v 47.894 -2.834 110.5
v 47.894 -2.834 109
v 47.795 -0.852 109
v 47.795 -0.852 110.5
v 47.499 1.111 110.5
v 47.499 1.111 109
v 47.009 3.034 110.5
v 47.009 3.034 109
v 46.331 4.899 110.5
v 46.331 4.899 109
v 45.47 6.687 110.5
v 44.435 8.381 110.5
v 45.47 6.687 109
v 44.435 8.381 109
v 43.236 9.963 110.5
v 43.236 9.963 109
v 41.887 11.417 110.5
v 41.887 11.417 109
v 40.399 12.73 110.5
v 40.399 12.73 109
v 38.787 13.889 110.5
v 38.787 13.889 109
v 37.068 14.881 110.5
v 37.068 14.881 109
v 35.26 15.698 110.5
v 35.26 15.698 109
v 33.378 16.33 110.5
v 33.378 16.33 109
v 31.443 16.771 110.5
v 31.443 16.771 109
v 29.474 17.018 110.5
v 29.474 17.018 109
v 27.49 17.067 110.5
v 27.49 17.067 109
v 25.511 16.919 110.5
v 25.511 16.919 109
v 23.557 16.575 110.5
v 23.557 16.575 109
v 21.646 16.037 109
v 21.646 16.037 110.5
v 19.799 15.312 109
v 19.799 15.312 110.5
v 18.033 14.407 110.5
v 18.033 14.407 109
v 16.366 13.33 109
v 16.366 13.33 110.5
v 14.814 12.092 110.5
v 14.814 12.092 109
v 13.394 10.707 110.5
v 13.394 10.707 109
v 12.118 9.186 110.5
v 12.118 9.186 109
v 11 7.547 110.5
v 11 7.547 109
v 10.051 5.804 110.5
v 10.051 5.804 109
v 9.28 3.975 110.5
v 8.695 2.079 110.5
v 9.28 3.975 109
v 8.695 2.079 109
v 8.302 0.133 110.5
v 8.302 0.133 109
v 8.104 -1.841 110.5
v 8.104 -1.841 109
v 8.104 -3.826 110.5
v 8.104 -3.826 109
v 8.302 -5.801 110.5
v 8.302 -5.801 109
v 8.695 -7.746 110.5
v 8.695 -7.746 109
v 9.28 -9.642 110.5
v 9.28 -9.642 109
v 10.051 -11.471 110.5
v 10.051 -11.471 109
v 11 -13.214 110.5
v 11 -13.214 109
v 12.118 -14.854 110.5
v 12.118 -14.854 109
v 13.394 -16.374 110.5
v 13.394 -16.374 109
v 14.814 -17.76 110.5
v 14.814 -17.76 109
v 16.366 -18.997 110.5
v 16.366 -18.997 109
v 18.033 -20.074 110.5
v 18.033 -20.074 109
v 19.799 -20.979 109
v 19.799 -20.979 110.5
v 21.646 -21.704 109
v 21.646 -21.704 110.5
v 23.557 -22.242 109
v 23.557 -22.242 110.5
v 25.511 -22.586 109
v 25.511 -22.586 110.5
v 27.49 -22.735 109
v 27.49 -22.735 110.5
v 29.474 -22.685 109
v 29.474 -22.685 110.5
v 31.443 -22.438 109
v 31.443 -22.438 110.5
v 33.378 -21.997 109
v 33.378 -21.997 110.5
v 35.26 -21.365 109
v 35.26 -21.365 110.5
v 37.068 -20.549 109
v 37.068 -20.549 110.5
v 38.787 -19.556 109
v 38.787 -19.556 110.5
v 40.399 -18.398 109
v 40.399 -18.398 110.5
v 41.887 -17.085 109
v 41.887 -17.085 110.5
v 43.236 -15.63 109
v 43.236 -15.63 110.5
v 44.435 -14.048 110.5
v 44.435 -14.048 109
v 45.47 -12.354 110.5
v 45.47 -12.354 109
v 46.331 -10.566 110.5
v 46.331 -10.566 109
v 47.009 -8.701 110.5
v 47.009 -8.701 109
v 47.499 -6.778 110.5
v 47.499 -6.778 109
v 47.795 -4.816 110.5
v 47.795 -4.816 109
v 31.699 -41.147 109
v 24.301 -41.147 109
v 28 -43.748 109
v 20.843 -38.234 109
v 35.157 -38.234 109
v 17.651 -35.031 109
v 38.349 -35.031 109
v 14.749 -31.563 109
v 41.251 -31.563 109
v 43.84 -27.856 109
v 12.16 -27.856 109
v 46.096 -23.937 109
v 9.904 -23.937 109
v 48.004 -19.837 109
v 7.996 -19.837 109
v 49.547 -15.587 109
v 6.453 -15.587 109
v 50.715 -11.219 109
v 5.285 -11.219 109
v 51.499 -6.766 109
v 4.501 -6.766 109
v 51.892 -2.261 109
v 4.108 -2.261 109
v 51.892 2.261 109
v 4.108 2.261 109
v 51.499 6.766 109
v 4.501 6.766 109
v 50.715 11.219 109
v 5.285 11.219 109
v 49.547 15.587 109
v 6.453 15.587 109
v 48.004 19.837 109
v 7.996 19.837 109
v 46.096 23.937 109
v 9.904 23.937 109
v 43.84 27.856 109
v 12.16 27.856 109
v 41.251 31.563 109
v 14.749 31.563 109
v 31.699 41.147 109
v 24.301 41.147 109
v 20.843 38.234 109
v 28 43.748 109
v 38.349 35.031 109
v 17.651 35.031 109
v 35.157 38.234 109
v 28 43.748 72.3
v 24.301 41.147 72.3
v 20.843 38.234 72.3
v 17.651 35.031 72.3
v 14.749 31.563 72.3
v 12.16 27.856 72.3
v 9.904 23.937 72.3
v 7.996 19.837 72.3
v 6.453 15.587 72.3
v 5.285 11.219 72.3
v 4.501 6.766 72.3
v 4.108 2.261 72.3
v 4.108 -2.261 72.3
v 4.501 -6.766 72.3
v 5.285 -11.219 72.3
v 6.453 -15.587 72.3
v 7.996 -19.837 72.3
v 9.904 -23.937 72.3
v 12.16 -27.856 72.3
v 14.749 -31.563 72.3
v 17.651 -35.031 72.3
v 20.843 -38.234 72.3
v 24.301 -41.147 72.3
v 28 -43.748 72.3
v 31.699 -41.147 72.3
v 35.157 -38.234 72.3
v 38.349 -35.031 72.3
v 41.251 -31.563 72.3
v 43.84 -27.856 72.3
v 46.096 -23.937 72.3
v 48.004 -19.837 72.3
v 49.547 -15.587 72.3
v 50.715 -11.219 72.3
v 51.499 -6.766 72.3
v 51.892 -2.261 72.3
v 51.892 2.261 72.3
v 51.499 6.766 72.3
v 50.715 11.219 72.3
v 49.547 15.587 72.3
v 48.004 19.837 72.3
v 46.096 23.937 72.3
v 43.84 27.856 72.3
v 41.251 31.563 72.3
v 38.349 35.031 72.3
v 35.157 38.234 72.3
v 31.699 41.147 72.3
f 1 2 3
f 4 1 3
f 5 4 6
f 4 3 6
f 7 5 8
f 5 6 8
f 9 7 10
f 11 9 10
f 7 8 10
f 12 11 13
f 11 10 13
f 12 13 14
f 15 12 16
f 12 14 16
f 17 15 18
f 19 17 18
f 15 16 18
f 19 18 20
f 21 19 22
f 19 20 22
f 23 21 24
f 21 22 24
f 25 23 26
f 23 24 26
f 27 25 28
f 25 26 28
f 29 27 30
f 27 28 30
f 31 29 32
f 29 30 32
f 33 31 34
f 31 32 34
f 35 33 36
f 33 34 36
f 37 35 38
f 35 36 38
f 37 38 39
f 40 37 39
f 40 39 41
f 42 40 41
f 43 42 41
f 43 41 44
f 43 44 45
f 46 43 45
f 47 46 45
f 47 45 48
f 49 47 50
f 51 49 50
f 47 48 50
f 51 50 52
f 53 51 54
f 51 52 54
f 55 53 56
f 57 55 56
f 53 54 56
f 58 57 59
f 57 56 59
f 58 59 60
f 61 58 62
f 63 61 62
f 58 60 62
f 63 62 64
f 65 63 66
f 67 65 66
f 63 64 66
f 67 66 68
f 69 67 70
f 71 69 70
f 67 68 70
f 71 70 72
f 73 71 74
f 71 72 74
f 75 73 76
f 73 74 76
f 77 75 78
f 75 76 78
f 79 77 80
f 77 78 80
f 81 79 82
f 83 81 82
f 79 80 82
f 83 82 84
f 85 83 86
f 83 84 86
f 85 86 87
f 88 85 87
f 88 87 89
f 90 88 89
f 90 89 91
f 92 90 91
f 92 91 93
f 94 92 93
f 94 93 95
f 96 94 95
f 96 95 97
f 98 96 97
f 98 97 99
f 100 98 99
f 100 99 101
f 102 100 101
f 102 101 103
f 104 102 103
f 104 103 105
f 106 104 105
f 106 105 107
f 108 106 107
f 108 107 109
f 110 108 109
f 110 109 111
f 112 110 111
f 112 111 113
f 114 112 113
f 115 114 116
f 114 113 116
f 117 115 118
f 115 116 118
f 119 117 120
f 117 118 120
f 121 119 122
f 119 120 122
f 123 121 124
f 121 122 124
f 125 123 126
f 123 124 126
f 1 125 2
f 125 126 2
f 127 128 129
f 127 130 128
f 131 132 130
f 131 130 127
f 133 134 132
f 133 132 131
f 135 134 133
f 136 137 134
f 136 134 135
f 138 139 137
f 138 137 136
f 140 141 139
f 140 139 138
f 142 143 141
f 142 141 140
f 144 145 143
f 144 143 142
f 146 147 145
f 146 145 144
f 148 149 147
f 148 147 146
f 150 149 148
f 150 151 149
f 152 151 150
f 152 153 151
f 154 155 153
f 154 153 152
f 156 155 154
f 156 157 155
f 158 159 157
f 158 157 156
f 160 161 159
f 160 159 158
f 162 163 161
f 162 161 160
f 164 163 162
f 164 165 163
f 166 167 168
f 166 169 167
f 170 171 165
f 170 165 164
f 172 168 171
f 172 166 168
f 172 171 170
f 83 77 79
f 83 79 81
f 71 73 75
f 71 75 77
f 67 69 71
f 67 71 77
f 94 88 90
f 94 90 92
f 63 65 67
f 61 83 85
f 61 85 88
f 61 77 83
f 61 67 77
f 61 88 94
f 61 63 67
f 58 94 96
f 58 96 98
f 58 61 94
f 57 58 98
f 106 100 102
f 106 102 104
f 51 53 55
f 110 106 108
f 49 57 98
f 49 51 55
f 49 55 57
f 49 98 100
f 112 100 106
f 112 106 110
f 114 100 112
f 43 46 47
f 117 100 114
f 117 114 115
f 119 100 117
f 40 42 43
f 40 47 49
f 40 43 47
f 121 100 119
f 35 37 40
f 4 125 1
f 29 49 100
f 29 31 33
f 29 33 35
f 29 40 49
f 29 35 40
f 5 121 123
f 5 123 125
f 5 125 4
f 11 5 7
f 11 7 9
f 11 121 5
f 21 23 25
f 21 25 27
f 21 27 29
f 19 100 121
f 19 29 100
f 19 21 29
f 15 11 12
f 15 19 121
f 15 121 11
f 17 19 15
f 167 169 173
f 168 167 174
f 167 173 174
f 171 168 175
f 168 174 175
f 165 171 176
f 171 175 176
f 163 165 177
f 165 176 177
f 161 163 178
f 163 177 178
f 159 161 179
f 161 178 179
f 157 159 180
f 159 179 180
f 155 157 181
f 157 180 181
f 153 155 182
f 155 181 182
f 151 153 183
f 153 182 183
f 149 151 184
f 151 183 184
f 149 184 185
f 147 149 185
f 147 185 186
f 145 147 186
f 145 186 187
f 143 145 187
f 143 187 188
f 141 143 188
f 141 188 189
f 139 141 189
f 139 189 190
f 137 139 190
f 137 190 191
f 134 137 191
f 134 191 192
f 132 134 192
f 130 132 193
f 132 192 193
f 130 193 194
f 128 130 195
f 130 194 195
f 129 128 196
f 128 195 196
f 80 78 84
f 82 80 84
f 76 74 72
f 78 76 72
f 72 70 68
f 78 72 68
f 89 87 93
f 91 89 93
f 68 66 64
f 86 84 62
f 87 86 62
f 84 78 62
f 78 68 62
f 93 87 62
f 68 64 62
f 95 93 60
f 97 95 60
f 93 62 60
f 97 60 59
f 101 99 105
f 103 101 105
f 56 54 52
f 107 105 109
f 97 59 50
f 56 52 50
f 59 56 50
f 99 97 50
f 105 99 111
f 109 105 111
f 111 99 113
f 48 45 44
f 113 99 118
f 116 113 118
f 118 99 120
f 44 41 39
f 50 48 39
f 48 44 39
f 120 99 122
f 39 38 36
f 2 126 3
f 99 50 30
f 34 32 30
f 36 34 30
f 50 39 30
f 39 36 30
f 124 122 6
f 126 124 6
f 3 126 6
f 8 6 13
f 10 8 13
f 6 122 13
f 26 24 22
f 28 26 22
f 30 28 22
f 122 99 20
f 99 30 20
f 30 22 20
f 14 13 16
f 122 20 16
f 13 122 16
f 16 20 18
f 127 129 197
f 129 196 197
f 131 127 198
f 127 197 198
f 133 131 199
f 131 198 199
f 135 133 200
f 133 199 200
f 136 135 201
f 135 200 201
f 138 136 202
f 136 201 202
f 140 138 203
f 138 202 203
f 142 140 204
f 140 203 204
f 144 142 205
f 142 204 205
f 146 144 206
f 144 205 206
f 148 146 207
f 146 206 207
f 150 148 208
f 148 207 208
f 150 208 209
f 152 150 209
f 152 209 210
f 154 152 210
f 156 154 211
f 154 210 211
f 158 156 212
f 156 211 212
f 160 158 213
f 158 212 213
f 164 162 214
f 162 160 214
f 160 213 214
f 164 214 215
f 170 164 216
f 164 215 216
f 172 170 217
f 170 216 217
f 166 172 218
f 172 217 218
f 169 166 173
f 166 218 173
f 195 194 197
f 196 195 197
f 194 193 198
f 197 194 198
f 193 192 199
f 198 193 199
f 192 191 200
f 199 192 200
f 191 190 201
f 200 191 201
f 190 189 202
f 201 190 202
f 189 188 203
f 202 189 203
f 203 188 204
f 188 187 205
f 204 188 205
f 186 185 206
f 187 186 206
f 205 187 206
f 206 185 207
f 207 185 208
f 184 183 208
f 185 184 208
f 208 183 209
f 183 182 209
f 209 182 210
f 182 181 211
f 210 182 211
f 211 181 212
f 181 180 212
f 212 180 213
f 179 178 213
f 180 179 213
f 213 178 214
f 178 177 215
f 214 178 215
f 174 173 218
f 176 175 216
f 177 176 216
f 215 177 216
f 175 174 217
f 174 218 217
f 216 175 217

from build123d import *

# Parameters (mm, degrees)
F0_R     = 51.941026
F1_DEPTH = 109
F4_R     = 19.907285
F5_DEPTH = 1.5


with BuildPart() as f1:
    # F0 (on Top) → F1 (new body)
    with BuildSketch(Plane.XY):
        Circle(F0_R)
    extrude(amount=F1_DEPTH)


with BuildPart() as f2_1:
    # F2: copy of F1
    add(f1.part.moved(Location((56, 0, 72.3))))


with BuildPart() as f1_1:
    add(f1.part)

    # F3: intersect F2_1
    add(f2_1.part, mode=Mode.INTERSECT)


with BuildPart() as f5:
    # F4 (on face) → F5 (new body)
    with BuildSketch(Plane.XY.offset(109)):
        with Locations((27.986579, -2.833651)):
            Circle(F4_R)
    extrude(amount=F5_DEPTH)


solid = Compound([f1_1.part, f5.part])
